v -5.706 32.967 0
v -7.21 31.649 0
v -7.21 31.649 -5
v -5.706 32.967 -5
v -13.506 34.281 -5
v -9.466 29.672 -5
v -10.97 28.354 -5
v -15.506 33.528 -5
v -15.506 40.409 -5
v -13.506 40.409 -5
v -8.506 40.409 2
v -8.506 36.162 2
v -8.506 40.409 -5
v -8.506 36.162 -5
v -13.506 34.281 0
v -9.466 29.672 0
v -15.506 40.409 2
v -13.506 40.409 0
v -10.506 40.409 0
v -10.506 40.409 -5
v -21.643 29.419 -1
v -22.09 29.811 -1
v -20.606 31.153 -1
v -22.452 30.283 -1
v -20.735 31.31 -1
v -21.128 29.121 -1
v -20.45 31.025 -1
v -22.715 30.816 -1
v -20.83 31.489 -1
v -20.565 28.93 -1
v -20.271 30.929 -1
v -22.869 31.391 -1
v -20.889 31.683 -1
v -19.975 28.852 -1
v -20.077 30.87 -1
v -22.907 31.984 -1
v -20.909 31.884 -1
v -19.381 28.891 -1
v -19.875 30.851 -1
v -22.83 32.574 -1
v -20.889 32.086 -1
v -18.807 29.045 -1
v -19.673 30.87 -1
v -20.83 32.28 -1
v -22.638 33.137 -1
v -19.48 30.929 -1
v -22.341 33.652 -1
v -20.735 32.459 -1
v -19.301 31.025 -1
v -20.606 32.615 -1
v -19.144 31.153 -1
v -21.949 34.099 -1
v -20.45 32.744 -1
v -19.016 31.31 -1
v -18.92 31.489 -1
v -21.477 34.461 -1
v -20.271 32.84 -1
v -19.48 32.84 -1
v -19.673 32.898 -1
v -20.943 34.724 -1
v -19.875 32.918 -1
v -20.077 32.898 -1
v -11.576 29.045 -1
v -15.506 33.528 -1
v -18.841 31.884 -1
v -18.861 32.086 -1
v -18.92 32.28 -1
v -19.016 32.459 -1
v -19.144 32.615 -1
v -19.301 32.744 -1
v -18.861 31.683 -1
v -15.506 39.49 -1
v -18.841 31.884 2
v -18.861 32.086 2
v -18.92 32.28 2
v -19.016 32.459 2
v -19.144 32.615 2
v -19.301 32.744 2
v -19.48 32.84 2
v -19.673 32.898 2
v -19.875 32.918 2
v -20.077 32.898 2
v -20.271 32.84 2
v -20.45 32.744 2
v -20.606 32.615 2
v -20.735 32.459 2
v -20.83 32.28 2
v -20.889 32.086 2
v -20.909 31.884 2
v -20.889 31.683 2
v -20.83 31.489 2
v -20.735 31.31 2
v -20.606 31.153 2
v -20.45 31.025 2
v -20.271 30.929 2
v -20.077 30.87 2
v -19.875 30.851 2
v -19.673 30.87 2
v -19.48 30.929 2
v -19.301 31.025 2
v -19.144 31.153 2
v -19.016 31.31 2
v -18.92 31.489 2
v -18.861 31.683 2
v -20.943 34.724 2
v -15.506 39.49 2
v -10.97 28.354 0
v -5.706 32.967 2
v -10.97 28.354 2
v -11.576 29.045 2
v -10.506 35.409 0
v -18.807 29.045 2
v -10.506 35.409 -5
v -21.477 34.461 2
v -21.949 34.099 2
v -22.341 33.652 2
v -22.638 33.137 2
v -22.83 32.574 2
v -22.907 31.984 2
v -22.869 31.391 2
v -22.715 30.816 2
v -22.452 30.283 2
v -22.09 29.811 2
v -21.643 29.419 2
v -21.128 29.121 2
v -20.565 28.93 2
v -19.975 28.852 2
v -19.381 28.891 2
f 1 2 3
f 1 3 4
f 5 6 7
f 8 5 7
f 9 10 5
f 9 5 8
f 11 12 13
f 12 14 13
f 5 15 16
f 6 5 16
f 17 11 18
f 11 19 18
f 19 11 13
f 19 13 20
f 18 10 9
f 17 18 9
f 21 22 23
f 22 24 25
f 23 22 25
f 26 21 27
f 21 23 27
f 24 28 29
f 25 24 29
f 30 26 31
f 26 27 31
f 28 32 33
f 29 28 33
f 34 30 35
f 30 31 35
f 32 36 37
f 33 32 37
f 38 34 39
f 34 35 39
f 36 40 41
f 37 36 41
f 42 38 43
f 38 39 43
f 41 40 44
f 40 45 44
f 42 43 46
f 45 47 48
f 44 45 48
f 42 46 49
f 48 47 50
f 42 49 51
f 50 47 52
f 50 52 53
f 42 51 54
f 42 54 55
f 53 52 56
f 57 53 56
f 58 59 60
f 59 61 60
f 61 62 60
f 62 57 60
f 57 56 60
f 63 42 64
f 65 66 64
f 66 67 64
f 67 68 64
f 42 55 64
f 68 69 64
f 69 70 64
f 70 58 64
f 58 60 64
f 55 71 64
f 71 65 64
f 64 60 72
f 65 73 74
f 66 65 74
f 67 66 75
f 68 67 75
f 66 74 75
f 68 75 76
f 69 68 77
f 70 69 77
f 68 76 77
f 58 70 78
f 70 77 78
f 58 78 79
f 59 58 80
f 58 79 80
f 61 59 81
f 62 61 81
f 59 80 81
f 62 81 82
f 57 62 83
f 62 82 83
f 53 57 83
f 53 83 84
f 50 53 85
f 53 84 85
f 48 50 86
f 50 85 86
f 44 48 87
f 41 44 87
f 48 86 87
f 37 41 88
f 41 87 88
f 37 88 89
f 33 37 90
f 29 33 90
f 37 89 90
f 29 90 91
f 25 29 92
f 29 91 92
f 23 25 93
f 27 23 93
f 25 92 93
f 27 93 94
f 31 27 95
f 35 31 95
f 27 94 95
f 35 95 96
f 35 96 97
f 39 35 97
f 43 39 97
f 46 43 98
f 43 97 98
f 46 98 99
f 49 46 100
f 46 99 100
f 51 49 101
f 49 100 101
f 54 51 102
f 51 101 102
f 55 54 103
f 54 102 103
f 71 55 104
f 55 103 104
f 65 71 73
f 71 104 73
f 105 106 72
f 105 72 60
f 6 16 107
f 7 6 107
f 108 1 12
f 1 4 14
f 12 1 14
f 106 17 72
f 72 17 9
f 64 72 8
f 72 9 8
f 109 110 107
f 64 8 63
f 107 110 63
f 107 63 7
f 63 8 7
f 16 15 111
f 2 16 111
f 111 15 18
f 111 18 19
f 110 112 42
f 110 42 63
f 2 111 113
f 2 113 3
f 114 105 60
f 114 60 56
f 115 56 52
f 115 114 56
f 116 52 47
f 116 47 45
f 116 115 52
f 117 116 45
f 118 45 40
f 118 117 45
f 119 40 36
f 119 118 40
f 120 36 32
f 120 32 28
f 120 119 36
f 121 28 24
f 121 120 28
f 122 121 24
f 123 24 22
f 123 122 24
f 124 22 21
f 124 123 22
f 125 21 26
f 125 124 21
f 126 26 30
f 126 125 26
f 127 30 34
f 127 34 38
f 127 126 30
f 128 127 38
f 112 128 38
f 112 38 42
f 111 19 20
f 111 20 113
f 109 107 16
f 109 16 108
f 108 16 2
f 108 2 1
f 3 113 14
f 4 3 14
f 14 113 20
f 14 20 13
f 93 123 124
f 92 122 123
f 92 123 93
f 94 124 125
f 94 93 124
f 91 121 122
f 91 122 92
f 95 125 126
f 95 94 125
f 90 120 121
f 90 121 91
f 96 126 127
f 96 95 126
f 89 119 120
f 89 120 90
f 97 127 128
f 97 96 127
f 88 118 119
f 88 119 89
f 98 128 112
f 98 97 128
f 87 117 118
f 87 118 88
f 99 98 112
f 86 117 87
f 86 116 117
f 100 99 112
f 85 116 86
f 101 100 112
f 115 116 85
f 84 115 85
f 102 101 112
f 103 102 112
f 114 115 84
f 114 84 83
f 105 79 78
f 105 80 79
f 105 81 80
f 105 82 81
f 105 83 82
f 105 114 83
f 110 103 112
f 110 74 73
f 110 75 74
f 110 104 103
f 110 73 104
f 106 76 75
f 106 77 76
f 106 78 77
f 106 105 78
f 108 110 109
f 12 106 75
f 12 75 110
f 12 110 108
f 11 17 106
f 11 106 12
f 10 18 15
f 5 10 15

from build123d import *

# Parameters (mm, degrees)
BOSS_EXTRUDE1_DEPTH   = 5
BOSS_EXTRUDE1_2_DEPTH = 5
BOSS_EXTRUDE2_DEPTH   = 2
SKETCH3_R             = 1.033864096
BOSS_EXTRUDE3_DEPTH   = 3


with BuildPart() as part:
    # Sketch1 → Boss-Extrude1 (new body)
    with BuildSketch(Plane.XY):
        Polygon((-10.505514799, 35.409303061), (-7.209900565, 31.649126626), (-5.705829991, 32.967372319), (-8.505514799, 36.161711248), (-8.505514799, 40.409303061), (-10.505514799, 40.409303061), align=None)
    extrude(amount=-BOSS_EXTRUDE1_DEPTH)



with BuildPart() as body_2:
    # Sketch1 → Boss-Extrude1 2 (new body)
    with BuildSketch(Plane.XY):
        Polygon((-13.505514799, 34.280690781), (-9.466006426, 29.671758086), (-10.970077001, 28.353512393), (-15.505514799, 33.528282595), (-15.505514799, 40.409303061), (-13.505514799, 40.409303061), align=None)
    extrude(amount=-BOSS_EXTRUDE1_2_DEPTH)


with BuildPart() as part_1:
    add(part.part)

    add(body_2.part)  # Boss-Extrude2 merges body 2
    # Sketch2 → Boss-Extrude2 (add)
    with BuildSketch(Plane.XY):
        Polygon((-10.970077001, 28.353512393), (-5.705829991, 32.967372319), (-8.505514799, 36.161711248), (-8.505514799, 40.409303061), (-15.505514799, 40.409303061), (-15.505514799, 33.528282595), align=None)
    extrude(amount=BOSS_EXTRUDE2_DEPTH)

    # Sketch3 → Boss-Extrude3 (add)
    with BuildSketch(Plane.XY.offset(2)):
        with BuildLine():
            Line((-11.57598817, 29.044835084), (-15.505514799, 33.528282595))
            Line((-15.505514799, 33.528282595), (-15.505514799, 39.490034108))
            Line((-15.505514799, 39.490034108), (-20.943415916, 34.723974688))
            ThreePointArc((-20.943415916, 34.723974688), (-22.714727935, 30.816147103), (-18.80690035, 29.044835084))
            Line((-18.80690035, 29.044835084), (-11.57598817, 29.044835084))
        make_face()
        with Locations((-19.875158133, 31.884404886)):
            Circle(SKETCH3_R, mode=Mode.SUBTRACT)
    extrude(amount=-BOSS_EXTRUDE3_DEPTH)


solid = part_1.part
